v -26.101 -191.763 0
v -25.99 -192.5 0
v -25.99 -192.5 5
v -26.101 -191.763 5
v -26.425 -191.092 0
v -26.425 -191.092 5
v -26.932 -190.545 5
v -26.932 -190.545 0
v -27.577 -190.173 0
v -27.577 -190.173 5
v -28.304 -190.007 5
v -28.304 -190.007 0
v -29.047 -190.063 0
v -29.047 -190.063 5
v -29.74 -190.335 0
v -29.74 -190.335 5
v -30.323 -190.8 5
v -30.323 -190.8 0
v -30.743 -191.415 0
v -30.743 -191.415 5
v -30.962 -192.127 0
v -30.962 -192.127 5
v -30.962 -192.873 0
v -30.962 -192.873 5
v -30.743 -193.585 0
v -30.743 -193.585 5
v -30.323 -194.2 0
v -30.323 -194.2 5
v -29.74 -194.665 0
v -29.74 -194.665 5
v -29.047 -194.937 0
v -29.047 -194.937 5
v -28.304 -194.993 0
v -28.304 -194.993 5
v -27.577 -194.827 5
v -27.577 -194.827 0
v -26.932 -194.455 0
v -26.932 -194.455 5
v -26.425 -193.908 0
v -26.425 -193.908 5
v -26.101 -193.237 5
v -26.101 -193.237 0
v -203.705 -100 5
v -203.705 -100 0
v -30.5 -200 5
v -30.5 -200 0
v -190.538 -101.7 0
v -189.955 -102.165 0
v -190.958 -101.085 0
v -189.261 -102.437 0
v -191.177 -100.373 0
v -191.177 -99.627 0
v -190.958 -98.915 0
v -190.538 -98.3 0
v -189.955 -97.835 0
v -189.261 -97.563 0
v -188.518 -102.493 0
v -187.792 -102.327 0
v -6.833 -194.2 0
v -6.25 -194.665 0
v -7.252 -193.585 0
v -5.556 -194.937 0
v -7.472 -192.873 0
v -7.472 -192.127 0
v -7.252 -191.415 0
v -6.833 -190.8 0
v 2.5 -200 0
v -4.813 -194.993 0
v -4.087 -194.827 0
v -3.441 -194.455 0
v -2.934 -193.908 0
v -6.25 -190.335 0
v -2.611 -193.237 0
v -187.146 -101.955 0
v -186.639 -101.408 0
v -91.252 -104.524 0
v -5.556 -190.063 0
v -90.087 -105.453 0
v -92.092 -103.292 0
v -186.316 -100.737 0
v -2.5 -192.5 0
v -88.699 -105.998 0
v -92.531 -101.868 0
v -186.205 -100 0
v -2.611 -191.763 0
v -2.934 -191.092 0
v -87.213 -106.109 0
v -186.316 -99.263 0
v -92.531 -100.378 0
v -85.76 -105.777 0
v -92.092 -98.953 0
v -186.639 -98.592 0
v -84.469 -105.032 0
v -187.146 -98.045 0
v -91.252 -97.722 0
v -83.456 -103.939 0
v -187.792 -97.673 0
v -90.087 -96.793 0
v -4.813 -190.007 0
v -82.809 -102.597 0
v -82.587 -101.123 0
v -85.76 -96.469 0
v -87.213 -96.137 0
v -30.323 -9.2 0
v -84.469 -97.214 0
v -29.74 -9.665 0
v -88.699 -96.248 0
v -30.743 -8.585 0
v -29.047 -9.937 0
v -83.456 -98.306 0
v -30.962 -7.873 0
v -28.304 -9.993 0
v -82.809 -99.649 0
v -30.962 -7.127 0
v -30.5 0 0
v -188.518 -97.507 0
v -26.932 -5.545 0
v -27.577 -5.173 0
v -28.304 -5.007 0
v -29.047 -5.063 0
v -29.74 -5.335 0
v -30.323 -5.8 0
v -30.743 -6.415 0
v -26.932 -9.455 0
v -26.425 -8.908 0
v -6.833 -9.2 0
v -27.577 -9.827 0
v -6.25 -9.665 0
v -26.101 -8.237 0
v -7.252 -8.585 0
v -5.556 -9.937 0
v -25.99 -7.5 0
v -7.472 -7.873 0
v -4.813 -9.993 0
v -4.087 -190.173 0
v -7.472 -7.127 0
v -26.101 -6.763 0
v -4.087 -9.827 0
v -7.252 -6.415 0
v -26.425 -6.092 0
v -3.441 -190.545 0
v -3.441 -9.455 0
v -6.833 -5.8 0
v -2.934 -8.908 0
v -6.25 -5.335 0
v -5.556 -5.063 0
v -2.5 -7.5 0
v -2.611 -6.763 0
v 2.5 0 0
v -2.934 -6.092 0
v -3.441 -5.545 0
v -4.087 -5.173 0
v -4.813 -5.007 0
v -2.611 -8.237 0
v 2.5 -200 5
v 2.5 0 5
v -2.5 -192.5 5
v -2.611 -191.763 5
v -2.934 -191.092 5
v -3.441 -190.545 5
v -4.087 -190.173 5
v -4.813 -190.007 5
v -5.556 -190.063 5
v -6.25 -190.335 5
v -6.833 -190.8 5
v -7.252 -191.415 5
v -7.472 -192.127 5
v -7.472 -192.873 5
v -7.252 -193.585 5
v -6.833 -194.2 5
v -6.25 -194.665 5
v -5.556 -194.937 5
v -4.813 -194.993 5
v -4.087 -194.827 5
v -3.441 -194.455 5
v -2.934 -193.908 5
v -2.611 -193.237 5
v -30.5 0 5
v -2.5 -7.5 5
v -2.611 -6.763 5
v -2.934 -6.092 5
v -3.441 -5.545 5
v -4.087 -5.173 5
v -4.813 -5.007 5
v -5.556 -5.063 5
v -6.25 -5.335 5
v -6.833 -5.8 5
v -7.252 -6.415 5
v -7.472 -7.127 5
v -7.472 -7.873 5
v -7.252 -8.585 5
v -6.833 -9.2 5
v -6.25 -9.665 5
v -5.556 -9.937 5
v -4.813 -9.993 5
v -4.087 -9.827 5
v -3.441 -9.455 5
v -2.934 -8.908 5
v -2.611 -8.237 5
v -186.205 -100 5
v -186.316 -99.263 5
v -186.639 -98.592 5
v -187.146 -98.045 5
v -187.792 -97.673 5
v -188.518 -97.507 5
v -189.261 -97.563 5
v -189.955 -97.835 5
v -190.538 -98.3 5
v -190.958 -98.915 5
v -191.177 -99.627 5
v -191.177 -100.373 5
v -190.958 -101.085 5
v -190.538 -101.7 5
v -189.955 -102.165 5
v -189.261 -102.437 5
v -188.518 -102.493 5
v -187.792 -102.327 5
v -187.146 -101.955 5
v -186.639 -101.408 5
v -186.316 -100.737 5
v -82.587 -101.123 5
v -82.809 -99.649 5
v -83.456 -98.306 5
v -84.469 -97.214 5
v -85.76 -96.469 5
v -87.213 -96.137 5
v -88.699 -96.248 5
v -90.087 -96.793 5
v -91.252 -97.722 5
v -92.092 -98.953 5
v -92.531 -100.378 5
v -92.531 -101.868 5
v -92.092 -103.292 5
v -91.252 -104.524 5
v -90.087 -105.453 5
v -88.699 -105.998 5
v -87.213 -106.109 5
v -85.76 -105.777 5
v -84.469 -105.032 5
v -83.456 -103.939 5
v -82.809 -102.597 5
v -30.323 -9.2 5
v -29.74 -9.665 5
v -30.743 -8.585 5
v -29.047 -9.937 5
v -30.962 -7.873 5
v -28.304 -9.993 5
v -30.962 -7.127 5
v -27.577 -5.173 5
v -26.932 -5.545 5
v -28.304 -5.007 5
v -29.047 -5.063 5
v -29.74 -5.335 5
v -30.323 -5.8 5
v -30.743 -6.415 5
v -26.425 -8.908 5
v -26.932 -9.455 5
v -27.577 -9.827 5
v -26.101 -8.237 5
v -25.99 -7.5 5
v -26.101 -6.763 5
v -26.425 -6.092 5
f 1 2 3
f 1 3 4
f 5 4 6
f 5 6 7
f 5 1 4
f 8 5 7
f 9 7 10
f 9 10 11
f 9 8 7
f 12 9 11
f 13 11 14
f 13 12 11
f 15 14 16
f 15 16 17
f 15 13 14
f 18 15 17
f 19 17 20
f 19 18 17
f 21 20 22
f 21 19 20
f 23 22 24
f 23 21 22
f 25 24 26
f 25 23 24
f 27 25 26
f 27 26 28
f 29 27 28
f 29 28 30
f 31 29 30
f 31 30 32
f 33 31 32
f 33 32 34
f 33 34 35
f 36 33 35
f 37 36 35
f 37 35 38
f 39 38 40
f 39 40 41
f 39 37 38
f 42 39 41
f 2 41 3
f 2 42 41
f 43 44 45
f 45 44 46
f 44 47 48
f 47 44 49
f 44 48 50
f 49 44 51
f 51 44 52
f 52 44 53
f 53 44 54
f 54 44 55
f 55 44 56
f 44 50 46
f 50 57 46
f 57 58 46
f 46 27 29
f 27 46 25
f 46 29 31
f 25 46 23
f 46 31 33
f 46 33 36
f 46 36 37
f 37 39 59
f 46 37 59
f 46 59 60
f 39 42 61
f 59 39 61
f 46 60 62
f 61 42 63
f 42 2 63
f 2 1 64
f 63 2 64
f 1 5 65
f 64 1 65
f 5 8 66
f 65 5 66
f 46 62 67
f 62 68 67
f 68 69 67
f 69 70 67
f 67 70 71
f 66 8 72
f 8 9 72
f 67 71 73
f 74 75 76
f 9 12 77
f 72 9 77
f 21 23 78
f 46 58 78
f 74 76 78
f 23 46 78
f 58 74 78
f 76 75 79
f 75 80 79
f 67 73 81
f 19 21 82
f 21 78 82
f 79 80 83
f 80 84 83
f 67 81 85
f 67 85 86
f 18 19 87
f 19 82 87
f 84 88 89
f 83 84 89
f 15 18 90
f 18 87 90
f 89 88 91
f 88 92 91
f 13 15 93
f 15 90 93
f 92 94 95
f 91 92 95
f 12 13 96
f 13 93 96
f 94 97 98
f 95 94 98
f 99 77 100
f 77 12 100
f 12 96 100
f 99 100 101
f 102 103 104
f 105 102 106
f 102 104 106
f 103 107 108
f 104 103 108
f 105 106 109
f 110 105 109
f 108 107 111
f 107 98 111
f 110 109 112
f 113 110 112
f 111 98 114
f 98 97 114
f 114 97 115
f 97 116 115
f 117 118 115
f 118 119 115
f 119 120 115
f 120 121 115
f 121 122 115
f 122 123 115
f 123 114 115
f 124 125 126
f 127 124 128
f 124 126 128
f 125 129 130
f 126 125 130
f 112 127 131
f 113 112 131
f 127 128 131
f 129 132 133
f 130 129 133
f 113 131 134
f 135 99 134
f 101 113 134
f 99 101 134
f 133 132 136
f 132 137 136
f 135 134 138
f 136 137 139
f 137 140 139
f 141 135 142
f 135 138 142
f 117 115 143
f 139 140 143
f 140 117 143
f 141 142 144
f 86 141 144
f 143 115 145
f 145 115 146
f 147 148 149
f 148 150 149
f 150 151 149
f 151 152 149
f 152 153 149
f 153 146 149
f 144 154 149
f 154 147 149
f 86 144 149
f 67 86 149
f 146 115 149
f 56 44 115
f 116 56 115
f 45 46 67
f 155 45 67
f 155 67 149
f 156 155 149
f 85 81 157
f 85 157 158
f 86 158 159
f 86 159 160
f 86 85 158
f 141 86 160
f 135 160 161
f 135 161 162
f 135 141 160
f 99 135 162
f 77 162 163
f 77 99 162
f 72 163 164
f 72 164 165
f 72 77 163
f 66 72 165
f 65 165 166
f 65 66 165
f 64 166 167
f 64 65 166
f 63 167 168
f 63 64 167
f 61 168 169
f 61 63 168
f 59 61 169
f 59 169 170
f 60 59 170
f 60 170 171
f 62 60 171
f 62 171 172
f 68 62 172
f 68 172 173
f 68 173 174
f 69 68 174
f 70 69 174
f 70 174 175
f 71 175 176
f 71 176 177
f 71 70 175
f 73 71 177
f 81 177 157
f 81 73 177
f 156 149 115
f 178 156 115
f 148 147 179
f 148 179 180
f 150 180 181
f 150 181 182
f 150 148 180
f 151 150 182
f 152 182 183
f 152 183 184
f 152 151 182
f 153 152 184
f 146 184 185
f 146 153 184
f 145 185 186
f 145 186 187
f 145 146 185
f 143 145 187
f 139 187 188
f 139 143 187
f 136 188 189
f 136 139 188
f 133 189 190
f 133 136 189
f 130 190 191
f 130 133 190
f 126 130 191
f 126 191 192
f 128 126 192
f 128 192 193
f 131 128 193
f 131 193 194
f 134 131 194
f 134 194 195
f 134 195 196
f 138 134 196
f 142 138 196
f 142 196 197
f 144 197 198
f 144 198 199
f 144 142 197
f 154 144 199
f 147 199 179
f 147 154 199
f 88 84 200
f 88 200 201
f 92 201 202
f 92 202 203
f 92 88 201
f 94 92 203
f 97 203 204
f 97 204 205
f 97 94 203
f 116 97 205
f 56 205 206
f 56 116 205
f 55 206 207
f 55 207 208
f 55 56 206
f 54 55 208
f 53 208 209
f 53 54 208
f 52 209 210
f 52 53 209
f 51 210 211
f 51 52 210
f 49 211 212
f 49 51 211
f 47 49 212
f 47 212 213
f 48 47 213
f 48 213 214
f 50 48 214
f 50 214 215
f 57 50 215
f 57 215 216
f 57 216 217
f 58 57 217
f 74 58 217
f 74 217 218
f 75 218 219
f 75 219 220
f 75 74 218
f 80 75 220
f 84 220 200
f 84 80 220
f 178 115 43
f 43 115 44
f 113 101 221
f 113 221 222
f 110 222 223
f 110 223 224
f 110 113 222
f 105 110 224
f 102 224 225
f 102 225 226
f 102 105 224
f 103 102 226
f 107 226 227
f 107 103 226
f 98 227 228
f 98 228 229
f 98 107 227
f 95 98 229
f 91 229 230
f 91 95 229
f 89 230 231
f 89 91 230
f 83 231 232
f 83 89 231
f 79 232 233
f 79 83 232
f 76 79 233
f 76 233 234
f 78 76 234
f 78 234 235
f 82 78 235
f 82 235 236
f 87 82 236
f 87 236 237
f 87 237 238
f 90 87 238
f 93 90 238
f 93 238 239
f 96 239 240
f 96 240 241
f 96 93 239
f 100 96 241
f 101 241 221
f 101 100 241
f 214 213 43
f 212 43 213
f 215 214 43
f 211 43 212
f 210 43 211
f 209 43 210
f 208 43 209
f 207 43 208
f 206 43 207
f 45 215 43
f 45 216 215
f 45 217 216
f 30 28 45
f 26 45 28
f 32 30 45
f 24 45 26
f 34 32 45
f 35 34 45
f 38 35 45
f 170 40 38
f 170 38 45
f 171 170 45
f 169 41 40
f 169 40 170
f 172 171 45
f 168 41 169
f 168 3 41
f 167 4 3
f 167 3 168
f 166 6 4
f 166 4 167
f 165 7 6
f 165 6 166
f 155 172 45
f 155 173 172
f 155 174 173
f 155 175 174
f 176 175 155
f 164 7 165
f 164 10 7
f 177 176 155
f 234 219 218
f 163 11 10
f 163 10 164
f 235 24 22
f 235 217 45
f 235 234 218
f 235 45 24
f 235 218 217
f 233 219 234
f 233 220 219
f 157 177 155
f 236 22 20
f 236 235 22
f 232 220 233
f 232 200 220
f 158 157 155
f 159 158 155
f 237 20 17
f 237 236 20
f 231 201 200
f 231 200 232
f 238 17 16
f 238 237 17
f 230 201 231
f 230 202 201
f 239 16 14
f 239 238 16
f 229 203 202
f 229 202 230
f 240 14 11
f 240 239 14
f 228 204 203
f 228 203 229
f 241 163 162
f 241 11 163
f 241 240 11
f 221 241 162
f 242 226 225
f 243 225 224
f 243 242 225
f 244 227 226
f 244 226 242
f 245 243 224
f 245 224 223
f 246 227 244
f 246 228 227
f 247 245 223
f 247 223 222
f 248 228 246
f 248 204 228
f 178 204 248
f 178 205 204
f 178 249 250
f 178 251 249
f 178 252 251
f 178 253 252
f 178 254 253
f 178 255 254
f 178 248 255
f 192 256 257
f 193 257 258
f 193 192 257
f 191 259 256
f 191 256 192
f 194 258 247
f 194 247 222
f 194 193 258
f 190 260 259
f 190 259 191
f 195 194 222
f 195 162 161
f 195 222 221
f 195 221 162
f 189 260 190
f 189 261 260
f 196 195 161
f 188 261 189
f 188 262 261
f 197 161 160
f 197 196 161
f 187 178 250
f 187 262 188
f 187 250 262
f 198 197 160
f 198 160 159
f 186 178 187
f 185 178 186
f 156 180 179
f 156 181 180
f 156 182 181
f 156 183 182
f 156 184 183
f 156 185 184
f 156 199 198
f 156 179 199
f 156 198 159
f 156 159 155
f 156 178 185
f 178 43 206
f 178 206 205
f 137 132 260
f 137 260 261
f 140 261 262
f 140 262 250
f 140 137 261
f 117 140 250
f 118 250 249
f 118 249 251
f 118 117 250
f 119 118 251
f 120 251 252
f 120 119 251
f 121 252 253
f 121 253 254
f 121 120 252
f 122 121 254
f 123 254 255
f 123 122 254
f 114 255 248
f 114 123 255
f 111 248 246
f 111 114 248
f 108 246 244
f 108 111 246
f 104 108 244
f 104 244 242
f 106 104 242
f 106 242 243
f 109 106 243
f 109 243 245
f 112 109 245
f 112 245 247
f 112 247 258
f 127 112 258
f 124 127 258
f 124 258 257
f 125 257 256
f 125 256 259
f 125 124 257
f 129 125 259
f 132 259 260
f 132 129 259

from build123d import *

# Parameters (mm, degrees)
SKETCH1_R           = 2.5
SKETCH1_R_2         = 5
BOSS_EXTRUDE1_DEPTH = 5


with BuildPart() as part:
    # Sketch1 → Boss-Extrude1 (new body)
    with BuildSketch(Plane.XY):
        Polygon((-30.5, 0), (-203.705080757, -100), (-30.5, -200), (2.5, -200), (2.5, 0), align=None)
        with Locations((-188.705080757, -100)):
            Circle(SKETCH1_R, mode=Mode.SUBTRACT)
        with Locations((-28.490381057, -7.5)):
            Circle(SKETCH1_R, mode=Mode.SUBTRACT)
        with Locations((-5, -7.5)):
            Circle(SKETCH1_R, mode=Mode.SUBTRACT)
        with Locations((-5, -192.5)):
            Circle(SKETCH1_R, mode=Mode.SUBTRACT)
        with Locations((-28.490381057, -192.5)):
            Circle(SKETCH1_R, mode=Mode.SUBTRACT)
        with Locations((-87.586729605, -101.122883886)):
            Circle(SKETCH1_R_2, mode=Mode.SUBTRACT)
    extrude(amount=BOSS_EXTRUDE1_DEPTH)


solid = part.part
